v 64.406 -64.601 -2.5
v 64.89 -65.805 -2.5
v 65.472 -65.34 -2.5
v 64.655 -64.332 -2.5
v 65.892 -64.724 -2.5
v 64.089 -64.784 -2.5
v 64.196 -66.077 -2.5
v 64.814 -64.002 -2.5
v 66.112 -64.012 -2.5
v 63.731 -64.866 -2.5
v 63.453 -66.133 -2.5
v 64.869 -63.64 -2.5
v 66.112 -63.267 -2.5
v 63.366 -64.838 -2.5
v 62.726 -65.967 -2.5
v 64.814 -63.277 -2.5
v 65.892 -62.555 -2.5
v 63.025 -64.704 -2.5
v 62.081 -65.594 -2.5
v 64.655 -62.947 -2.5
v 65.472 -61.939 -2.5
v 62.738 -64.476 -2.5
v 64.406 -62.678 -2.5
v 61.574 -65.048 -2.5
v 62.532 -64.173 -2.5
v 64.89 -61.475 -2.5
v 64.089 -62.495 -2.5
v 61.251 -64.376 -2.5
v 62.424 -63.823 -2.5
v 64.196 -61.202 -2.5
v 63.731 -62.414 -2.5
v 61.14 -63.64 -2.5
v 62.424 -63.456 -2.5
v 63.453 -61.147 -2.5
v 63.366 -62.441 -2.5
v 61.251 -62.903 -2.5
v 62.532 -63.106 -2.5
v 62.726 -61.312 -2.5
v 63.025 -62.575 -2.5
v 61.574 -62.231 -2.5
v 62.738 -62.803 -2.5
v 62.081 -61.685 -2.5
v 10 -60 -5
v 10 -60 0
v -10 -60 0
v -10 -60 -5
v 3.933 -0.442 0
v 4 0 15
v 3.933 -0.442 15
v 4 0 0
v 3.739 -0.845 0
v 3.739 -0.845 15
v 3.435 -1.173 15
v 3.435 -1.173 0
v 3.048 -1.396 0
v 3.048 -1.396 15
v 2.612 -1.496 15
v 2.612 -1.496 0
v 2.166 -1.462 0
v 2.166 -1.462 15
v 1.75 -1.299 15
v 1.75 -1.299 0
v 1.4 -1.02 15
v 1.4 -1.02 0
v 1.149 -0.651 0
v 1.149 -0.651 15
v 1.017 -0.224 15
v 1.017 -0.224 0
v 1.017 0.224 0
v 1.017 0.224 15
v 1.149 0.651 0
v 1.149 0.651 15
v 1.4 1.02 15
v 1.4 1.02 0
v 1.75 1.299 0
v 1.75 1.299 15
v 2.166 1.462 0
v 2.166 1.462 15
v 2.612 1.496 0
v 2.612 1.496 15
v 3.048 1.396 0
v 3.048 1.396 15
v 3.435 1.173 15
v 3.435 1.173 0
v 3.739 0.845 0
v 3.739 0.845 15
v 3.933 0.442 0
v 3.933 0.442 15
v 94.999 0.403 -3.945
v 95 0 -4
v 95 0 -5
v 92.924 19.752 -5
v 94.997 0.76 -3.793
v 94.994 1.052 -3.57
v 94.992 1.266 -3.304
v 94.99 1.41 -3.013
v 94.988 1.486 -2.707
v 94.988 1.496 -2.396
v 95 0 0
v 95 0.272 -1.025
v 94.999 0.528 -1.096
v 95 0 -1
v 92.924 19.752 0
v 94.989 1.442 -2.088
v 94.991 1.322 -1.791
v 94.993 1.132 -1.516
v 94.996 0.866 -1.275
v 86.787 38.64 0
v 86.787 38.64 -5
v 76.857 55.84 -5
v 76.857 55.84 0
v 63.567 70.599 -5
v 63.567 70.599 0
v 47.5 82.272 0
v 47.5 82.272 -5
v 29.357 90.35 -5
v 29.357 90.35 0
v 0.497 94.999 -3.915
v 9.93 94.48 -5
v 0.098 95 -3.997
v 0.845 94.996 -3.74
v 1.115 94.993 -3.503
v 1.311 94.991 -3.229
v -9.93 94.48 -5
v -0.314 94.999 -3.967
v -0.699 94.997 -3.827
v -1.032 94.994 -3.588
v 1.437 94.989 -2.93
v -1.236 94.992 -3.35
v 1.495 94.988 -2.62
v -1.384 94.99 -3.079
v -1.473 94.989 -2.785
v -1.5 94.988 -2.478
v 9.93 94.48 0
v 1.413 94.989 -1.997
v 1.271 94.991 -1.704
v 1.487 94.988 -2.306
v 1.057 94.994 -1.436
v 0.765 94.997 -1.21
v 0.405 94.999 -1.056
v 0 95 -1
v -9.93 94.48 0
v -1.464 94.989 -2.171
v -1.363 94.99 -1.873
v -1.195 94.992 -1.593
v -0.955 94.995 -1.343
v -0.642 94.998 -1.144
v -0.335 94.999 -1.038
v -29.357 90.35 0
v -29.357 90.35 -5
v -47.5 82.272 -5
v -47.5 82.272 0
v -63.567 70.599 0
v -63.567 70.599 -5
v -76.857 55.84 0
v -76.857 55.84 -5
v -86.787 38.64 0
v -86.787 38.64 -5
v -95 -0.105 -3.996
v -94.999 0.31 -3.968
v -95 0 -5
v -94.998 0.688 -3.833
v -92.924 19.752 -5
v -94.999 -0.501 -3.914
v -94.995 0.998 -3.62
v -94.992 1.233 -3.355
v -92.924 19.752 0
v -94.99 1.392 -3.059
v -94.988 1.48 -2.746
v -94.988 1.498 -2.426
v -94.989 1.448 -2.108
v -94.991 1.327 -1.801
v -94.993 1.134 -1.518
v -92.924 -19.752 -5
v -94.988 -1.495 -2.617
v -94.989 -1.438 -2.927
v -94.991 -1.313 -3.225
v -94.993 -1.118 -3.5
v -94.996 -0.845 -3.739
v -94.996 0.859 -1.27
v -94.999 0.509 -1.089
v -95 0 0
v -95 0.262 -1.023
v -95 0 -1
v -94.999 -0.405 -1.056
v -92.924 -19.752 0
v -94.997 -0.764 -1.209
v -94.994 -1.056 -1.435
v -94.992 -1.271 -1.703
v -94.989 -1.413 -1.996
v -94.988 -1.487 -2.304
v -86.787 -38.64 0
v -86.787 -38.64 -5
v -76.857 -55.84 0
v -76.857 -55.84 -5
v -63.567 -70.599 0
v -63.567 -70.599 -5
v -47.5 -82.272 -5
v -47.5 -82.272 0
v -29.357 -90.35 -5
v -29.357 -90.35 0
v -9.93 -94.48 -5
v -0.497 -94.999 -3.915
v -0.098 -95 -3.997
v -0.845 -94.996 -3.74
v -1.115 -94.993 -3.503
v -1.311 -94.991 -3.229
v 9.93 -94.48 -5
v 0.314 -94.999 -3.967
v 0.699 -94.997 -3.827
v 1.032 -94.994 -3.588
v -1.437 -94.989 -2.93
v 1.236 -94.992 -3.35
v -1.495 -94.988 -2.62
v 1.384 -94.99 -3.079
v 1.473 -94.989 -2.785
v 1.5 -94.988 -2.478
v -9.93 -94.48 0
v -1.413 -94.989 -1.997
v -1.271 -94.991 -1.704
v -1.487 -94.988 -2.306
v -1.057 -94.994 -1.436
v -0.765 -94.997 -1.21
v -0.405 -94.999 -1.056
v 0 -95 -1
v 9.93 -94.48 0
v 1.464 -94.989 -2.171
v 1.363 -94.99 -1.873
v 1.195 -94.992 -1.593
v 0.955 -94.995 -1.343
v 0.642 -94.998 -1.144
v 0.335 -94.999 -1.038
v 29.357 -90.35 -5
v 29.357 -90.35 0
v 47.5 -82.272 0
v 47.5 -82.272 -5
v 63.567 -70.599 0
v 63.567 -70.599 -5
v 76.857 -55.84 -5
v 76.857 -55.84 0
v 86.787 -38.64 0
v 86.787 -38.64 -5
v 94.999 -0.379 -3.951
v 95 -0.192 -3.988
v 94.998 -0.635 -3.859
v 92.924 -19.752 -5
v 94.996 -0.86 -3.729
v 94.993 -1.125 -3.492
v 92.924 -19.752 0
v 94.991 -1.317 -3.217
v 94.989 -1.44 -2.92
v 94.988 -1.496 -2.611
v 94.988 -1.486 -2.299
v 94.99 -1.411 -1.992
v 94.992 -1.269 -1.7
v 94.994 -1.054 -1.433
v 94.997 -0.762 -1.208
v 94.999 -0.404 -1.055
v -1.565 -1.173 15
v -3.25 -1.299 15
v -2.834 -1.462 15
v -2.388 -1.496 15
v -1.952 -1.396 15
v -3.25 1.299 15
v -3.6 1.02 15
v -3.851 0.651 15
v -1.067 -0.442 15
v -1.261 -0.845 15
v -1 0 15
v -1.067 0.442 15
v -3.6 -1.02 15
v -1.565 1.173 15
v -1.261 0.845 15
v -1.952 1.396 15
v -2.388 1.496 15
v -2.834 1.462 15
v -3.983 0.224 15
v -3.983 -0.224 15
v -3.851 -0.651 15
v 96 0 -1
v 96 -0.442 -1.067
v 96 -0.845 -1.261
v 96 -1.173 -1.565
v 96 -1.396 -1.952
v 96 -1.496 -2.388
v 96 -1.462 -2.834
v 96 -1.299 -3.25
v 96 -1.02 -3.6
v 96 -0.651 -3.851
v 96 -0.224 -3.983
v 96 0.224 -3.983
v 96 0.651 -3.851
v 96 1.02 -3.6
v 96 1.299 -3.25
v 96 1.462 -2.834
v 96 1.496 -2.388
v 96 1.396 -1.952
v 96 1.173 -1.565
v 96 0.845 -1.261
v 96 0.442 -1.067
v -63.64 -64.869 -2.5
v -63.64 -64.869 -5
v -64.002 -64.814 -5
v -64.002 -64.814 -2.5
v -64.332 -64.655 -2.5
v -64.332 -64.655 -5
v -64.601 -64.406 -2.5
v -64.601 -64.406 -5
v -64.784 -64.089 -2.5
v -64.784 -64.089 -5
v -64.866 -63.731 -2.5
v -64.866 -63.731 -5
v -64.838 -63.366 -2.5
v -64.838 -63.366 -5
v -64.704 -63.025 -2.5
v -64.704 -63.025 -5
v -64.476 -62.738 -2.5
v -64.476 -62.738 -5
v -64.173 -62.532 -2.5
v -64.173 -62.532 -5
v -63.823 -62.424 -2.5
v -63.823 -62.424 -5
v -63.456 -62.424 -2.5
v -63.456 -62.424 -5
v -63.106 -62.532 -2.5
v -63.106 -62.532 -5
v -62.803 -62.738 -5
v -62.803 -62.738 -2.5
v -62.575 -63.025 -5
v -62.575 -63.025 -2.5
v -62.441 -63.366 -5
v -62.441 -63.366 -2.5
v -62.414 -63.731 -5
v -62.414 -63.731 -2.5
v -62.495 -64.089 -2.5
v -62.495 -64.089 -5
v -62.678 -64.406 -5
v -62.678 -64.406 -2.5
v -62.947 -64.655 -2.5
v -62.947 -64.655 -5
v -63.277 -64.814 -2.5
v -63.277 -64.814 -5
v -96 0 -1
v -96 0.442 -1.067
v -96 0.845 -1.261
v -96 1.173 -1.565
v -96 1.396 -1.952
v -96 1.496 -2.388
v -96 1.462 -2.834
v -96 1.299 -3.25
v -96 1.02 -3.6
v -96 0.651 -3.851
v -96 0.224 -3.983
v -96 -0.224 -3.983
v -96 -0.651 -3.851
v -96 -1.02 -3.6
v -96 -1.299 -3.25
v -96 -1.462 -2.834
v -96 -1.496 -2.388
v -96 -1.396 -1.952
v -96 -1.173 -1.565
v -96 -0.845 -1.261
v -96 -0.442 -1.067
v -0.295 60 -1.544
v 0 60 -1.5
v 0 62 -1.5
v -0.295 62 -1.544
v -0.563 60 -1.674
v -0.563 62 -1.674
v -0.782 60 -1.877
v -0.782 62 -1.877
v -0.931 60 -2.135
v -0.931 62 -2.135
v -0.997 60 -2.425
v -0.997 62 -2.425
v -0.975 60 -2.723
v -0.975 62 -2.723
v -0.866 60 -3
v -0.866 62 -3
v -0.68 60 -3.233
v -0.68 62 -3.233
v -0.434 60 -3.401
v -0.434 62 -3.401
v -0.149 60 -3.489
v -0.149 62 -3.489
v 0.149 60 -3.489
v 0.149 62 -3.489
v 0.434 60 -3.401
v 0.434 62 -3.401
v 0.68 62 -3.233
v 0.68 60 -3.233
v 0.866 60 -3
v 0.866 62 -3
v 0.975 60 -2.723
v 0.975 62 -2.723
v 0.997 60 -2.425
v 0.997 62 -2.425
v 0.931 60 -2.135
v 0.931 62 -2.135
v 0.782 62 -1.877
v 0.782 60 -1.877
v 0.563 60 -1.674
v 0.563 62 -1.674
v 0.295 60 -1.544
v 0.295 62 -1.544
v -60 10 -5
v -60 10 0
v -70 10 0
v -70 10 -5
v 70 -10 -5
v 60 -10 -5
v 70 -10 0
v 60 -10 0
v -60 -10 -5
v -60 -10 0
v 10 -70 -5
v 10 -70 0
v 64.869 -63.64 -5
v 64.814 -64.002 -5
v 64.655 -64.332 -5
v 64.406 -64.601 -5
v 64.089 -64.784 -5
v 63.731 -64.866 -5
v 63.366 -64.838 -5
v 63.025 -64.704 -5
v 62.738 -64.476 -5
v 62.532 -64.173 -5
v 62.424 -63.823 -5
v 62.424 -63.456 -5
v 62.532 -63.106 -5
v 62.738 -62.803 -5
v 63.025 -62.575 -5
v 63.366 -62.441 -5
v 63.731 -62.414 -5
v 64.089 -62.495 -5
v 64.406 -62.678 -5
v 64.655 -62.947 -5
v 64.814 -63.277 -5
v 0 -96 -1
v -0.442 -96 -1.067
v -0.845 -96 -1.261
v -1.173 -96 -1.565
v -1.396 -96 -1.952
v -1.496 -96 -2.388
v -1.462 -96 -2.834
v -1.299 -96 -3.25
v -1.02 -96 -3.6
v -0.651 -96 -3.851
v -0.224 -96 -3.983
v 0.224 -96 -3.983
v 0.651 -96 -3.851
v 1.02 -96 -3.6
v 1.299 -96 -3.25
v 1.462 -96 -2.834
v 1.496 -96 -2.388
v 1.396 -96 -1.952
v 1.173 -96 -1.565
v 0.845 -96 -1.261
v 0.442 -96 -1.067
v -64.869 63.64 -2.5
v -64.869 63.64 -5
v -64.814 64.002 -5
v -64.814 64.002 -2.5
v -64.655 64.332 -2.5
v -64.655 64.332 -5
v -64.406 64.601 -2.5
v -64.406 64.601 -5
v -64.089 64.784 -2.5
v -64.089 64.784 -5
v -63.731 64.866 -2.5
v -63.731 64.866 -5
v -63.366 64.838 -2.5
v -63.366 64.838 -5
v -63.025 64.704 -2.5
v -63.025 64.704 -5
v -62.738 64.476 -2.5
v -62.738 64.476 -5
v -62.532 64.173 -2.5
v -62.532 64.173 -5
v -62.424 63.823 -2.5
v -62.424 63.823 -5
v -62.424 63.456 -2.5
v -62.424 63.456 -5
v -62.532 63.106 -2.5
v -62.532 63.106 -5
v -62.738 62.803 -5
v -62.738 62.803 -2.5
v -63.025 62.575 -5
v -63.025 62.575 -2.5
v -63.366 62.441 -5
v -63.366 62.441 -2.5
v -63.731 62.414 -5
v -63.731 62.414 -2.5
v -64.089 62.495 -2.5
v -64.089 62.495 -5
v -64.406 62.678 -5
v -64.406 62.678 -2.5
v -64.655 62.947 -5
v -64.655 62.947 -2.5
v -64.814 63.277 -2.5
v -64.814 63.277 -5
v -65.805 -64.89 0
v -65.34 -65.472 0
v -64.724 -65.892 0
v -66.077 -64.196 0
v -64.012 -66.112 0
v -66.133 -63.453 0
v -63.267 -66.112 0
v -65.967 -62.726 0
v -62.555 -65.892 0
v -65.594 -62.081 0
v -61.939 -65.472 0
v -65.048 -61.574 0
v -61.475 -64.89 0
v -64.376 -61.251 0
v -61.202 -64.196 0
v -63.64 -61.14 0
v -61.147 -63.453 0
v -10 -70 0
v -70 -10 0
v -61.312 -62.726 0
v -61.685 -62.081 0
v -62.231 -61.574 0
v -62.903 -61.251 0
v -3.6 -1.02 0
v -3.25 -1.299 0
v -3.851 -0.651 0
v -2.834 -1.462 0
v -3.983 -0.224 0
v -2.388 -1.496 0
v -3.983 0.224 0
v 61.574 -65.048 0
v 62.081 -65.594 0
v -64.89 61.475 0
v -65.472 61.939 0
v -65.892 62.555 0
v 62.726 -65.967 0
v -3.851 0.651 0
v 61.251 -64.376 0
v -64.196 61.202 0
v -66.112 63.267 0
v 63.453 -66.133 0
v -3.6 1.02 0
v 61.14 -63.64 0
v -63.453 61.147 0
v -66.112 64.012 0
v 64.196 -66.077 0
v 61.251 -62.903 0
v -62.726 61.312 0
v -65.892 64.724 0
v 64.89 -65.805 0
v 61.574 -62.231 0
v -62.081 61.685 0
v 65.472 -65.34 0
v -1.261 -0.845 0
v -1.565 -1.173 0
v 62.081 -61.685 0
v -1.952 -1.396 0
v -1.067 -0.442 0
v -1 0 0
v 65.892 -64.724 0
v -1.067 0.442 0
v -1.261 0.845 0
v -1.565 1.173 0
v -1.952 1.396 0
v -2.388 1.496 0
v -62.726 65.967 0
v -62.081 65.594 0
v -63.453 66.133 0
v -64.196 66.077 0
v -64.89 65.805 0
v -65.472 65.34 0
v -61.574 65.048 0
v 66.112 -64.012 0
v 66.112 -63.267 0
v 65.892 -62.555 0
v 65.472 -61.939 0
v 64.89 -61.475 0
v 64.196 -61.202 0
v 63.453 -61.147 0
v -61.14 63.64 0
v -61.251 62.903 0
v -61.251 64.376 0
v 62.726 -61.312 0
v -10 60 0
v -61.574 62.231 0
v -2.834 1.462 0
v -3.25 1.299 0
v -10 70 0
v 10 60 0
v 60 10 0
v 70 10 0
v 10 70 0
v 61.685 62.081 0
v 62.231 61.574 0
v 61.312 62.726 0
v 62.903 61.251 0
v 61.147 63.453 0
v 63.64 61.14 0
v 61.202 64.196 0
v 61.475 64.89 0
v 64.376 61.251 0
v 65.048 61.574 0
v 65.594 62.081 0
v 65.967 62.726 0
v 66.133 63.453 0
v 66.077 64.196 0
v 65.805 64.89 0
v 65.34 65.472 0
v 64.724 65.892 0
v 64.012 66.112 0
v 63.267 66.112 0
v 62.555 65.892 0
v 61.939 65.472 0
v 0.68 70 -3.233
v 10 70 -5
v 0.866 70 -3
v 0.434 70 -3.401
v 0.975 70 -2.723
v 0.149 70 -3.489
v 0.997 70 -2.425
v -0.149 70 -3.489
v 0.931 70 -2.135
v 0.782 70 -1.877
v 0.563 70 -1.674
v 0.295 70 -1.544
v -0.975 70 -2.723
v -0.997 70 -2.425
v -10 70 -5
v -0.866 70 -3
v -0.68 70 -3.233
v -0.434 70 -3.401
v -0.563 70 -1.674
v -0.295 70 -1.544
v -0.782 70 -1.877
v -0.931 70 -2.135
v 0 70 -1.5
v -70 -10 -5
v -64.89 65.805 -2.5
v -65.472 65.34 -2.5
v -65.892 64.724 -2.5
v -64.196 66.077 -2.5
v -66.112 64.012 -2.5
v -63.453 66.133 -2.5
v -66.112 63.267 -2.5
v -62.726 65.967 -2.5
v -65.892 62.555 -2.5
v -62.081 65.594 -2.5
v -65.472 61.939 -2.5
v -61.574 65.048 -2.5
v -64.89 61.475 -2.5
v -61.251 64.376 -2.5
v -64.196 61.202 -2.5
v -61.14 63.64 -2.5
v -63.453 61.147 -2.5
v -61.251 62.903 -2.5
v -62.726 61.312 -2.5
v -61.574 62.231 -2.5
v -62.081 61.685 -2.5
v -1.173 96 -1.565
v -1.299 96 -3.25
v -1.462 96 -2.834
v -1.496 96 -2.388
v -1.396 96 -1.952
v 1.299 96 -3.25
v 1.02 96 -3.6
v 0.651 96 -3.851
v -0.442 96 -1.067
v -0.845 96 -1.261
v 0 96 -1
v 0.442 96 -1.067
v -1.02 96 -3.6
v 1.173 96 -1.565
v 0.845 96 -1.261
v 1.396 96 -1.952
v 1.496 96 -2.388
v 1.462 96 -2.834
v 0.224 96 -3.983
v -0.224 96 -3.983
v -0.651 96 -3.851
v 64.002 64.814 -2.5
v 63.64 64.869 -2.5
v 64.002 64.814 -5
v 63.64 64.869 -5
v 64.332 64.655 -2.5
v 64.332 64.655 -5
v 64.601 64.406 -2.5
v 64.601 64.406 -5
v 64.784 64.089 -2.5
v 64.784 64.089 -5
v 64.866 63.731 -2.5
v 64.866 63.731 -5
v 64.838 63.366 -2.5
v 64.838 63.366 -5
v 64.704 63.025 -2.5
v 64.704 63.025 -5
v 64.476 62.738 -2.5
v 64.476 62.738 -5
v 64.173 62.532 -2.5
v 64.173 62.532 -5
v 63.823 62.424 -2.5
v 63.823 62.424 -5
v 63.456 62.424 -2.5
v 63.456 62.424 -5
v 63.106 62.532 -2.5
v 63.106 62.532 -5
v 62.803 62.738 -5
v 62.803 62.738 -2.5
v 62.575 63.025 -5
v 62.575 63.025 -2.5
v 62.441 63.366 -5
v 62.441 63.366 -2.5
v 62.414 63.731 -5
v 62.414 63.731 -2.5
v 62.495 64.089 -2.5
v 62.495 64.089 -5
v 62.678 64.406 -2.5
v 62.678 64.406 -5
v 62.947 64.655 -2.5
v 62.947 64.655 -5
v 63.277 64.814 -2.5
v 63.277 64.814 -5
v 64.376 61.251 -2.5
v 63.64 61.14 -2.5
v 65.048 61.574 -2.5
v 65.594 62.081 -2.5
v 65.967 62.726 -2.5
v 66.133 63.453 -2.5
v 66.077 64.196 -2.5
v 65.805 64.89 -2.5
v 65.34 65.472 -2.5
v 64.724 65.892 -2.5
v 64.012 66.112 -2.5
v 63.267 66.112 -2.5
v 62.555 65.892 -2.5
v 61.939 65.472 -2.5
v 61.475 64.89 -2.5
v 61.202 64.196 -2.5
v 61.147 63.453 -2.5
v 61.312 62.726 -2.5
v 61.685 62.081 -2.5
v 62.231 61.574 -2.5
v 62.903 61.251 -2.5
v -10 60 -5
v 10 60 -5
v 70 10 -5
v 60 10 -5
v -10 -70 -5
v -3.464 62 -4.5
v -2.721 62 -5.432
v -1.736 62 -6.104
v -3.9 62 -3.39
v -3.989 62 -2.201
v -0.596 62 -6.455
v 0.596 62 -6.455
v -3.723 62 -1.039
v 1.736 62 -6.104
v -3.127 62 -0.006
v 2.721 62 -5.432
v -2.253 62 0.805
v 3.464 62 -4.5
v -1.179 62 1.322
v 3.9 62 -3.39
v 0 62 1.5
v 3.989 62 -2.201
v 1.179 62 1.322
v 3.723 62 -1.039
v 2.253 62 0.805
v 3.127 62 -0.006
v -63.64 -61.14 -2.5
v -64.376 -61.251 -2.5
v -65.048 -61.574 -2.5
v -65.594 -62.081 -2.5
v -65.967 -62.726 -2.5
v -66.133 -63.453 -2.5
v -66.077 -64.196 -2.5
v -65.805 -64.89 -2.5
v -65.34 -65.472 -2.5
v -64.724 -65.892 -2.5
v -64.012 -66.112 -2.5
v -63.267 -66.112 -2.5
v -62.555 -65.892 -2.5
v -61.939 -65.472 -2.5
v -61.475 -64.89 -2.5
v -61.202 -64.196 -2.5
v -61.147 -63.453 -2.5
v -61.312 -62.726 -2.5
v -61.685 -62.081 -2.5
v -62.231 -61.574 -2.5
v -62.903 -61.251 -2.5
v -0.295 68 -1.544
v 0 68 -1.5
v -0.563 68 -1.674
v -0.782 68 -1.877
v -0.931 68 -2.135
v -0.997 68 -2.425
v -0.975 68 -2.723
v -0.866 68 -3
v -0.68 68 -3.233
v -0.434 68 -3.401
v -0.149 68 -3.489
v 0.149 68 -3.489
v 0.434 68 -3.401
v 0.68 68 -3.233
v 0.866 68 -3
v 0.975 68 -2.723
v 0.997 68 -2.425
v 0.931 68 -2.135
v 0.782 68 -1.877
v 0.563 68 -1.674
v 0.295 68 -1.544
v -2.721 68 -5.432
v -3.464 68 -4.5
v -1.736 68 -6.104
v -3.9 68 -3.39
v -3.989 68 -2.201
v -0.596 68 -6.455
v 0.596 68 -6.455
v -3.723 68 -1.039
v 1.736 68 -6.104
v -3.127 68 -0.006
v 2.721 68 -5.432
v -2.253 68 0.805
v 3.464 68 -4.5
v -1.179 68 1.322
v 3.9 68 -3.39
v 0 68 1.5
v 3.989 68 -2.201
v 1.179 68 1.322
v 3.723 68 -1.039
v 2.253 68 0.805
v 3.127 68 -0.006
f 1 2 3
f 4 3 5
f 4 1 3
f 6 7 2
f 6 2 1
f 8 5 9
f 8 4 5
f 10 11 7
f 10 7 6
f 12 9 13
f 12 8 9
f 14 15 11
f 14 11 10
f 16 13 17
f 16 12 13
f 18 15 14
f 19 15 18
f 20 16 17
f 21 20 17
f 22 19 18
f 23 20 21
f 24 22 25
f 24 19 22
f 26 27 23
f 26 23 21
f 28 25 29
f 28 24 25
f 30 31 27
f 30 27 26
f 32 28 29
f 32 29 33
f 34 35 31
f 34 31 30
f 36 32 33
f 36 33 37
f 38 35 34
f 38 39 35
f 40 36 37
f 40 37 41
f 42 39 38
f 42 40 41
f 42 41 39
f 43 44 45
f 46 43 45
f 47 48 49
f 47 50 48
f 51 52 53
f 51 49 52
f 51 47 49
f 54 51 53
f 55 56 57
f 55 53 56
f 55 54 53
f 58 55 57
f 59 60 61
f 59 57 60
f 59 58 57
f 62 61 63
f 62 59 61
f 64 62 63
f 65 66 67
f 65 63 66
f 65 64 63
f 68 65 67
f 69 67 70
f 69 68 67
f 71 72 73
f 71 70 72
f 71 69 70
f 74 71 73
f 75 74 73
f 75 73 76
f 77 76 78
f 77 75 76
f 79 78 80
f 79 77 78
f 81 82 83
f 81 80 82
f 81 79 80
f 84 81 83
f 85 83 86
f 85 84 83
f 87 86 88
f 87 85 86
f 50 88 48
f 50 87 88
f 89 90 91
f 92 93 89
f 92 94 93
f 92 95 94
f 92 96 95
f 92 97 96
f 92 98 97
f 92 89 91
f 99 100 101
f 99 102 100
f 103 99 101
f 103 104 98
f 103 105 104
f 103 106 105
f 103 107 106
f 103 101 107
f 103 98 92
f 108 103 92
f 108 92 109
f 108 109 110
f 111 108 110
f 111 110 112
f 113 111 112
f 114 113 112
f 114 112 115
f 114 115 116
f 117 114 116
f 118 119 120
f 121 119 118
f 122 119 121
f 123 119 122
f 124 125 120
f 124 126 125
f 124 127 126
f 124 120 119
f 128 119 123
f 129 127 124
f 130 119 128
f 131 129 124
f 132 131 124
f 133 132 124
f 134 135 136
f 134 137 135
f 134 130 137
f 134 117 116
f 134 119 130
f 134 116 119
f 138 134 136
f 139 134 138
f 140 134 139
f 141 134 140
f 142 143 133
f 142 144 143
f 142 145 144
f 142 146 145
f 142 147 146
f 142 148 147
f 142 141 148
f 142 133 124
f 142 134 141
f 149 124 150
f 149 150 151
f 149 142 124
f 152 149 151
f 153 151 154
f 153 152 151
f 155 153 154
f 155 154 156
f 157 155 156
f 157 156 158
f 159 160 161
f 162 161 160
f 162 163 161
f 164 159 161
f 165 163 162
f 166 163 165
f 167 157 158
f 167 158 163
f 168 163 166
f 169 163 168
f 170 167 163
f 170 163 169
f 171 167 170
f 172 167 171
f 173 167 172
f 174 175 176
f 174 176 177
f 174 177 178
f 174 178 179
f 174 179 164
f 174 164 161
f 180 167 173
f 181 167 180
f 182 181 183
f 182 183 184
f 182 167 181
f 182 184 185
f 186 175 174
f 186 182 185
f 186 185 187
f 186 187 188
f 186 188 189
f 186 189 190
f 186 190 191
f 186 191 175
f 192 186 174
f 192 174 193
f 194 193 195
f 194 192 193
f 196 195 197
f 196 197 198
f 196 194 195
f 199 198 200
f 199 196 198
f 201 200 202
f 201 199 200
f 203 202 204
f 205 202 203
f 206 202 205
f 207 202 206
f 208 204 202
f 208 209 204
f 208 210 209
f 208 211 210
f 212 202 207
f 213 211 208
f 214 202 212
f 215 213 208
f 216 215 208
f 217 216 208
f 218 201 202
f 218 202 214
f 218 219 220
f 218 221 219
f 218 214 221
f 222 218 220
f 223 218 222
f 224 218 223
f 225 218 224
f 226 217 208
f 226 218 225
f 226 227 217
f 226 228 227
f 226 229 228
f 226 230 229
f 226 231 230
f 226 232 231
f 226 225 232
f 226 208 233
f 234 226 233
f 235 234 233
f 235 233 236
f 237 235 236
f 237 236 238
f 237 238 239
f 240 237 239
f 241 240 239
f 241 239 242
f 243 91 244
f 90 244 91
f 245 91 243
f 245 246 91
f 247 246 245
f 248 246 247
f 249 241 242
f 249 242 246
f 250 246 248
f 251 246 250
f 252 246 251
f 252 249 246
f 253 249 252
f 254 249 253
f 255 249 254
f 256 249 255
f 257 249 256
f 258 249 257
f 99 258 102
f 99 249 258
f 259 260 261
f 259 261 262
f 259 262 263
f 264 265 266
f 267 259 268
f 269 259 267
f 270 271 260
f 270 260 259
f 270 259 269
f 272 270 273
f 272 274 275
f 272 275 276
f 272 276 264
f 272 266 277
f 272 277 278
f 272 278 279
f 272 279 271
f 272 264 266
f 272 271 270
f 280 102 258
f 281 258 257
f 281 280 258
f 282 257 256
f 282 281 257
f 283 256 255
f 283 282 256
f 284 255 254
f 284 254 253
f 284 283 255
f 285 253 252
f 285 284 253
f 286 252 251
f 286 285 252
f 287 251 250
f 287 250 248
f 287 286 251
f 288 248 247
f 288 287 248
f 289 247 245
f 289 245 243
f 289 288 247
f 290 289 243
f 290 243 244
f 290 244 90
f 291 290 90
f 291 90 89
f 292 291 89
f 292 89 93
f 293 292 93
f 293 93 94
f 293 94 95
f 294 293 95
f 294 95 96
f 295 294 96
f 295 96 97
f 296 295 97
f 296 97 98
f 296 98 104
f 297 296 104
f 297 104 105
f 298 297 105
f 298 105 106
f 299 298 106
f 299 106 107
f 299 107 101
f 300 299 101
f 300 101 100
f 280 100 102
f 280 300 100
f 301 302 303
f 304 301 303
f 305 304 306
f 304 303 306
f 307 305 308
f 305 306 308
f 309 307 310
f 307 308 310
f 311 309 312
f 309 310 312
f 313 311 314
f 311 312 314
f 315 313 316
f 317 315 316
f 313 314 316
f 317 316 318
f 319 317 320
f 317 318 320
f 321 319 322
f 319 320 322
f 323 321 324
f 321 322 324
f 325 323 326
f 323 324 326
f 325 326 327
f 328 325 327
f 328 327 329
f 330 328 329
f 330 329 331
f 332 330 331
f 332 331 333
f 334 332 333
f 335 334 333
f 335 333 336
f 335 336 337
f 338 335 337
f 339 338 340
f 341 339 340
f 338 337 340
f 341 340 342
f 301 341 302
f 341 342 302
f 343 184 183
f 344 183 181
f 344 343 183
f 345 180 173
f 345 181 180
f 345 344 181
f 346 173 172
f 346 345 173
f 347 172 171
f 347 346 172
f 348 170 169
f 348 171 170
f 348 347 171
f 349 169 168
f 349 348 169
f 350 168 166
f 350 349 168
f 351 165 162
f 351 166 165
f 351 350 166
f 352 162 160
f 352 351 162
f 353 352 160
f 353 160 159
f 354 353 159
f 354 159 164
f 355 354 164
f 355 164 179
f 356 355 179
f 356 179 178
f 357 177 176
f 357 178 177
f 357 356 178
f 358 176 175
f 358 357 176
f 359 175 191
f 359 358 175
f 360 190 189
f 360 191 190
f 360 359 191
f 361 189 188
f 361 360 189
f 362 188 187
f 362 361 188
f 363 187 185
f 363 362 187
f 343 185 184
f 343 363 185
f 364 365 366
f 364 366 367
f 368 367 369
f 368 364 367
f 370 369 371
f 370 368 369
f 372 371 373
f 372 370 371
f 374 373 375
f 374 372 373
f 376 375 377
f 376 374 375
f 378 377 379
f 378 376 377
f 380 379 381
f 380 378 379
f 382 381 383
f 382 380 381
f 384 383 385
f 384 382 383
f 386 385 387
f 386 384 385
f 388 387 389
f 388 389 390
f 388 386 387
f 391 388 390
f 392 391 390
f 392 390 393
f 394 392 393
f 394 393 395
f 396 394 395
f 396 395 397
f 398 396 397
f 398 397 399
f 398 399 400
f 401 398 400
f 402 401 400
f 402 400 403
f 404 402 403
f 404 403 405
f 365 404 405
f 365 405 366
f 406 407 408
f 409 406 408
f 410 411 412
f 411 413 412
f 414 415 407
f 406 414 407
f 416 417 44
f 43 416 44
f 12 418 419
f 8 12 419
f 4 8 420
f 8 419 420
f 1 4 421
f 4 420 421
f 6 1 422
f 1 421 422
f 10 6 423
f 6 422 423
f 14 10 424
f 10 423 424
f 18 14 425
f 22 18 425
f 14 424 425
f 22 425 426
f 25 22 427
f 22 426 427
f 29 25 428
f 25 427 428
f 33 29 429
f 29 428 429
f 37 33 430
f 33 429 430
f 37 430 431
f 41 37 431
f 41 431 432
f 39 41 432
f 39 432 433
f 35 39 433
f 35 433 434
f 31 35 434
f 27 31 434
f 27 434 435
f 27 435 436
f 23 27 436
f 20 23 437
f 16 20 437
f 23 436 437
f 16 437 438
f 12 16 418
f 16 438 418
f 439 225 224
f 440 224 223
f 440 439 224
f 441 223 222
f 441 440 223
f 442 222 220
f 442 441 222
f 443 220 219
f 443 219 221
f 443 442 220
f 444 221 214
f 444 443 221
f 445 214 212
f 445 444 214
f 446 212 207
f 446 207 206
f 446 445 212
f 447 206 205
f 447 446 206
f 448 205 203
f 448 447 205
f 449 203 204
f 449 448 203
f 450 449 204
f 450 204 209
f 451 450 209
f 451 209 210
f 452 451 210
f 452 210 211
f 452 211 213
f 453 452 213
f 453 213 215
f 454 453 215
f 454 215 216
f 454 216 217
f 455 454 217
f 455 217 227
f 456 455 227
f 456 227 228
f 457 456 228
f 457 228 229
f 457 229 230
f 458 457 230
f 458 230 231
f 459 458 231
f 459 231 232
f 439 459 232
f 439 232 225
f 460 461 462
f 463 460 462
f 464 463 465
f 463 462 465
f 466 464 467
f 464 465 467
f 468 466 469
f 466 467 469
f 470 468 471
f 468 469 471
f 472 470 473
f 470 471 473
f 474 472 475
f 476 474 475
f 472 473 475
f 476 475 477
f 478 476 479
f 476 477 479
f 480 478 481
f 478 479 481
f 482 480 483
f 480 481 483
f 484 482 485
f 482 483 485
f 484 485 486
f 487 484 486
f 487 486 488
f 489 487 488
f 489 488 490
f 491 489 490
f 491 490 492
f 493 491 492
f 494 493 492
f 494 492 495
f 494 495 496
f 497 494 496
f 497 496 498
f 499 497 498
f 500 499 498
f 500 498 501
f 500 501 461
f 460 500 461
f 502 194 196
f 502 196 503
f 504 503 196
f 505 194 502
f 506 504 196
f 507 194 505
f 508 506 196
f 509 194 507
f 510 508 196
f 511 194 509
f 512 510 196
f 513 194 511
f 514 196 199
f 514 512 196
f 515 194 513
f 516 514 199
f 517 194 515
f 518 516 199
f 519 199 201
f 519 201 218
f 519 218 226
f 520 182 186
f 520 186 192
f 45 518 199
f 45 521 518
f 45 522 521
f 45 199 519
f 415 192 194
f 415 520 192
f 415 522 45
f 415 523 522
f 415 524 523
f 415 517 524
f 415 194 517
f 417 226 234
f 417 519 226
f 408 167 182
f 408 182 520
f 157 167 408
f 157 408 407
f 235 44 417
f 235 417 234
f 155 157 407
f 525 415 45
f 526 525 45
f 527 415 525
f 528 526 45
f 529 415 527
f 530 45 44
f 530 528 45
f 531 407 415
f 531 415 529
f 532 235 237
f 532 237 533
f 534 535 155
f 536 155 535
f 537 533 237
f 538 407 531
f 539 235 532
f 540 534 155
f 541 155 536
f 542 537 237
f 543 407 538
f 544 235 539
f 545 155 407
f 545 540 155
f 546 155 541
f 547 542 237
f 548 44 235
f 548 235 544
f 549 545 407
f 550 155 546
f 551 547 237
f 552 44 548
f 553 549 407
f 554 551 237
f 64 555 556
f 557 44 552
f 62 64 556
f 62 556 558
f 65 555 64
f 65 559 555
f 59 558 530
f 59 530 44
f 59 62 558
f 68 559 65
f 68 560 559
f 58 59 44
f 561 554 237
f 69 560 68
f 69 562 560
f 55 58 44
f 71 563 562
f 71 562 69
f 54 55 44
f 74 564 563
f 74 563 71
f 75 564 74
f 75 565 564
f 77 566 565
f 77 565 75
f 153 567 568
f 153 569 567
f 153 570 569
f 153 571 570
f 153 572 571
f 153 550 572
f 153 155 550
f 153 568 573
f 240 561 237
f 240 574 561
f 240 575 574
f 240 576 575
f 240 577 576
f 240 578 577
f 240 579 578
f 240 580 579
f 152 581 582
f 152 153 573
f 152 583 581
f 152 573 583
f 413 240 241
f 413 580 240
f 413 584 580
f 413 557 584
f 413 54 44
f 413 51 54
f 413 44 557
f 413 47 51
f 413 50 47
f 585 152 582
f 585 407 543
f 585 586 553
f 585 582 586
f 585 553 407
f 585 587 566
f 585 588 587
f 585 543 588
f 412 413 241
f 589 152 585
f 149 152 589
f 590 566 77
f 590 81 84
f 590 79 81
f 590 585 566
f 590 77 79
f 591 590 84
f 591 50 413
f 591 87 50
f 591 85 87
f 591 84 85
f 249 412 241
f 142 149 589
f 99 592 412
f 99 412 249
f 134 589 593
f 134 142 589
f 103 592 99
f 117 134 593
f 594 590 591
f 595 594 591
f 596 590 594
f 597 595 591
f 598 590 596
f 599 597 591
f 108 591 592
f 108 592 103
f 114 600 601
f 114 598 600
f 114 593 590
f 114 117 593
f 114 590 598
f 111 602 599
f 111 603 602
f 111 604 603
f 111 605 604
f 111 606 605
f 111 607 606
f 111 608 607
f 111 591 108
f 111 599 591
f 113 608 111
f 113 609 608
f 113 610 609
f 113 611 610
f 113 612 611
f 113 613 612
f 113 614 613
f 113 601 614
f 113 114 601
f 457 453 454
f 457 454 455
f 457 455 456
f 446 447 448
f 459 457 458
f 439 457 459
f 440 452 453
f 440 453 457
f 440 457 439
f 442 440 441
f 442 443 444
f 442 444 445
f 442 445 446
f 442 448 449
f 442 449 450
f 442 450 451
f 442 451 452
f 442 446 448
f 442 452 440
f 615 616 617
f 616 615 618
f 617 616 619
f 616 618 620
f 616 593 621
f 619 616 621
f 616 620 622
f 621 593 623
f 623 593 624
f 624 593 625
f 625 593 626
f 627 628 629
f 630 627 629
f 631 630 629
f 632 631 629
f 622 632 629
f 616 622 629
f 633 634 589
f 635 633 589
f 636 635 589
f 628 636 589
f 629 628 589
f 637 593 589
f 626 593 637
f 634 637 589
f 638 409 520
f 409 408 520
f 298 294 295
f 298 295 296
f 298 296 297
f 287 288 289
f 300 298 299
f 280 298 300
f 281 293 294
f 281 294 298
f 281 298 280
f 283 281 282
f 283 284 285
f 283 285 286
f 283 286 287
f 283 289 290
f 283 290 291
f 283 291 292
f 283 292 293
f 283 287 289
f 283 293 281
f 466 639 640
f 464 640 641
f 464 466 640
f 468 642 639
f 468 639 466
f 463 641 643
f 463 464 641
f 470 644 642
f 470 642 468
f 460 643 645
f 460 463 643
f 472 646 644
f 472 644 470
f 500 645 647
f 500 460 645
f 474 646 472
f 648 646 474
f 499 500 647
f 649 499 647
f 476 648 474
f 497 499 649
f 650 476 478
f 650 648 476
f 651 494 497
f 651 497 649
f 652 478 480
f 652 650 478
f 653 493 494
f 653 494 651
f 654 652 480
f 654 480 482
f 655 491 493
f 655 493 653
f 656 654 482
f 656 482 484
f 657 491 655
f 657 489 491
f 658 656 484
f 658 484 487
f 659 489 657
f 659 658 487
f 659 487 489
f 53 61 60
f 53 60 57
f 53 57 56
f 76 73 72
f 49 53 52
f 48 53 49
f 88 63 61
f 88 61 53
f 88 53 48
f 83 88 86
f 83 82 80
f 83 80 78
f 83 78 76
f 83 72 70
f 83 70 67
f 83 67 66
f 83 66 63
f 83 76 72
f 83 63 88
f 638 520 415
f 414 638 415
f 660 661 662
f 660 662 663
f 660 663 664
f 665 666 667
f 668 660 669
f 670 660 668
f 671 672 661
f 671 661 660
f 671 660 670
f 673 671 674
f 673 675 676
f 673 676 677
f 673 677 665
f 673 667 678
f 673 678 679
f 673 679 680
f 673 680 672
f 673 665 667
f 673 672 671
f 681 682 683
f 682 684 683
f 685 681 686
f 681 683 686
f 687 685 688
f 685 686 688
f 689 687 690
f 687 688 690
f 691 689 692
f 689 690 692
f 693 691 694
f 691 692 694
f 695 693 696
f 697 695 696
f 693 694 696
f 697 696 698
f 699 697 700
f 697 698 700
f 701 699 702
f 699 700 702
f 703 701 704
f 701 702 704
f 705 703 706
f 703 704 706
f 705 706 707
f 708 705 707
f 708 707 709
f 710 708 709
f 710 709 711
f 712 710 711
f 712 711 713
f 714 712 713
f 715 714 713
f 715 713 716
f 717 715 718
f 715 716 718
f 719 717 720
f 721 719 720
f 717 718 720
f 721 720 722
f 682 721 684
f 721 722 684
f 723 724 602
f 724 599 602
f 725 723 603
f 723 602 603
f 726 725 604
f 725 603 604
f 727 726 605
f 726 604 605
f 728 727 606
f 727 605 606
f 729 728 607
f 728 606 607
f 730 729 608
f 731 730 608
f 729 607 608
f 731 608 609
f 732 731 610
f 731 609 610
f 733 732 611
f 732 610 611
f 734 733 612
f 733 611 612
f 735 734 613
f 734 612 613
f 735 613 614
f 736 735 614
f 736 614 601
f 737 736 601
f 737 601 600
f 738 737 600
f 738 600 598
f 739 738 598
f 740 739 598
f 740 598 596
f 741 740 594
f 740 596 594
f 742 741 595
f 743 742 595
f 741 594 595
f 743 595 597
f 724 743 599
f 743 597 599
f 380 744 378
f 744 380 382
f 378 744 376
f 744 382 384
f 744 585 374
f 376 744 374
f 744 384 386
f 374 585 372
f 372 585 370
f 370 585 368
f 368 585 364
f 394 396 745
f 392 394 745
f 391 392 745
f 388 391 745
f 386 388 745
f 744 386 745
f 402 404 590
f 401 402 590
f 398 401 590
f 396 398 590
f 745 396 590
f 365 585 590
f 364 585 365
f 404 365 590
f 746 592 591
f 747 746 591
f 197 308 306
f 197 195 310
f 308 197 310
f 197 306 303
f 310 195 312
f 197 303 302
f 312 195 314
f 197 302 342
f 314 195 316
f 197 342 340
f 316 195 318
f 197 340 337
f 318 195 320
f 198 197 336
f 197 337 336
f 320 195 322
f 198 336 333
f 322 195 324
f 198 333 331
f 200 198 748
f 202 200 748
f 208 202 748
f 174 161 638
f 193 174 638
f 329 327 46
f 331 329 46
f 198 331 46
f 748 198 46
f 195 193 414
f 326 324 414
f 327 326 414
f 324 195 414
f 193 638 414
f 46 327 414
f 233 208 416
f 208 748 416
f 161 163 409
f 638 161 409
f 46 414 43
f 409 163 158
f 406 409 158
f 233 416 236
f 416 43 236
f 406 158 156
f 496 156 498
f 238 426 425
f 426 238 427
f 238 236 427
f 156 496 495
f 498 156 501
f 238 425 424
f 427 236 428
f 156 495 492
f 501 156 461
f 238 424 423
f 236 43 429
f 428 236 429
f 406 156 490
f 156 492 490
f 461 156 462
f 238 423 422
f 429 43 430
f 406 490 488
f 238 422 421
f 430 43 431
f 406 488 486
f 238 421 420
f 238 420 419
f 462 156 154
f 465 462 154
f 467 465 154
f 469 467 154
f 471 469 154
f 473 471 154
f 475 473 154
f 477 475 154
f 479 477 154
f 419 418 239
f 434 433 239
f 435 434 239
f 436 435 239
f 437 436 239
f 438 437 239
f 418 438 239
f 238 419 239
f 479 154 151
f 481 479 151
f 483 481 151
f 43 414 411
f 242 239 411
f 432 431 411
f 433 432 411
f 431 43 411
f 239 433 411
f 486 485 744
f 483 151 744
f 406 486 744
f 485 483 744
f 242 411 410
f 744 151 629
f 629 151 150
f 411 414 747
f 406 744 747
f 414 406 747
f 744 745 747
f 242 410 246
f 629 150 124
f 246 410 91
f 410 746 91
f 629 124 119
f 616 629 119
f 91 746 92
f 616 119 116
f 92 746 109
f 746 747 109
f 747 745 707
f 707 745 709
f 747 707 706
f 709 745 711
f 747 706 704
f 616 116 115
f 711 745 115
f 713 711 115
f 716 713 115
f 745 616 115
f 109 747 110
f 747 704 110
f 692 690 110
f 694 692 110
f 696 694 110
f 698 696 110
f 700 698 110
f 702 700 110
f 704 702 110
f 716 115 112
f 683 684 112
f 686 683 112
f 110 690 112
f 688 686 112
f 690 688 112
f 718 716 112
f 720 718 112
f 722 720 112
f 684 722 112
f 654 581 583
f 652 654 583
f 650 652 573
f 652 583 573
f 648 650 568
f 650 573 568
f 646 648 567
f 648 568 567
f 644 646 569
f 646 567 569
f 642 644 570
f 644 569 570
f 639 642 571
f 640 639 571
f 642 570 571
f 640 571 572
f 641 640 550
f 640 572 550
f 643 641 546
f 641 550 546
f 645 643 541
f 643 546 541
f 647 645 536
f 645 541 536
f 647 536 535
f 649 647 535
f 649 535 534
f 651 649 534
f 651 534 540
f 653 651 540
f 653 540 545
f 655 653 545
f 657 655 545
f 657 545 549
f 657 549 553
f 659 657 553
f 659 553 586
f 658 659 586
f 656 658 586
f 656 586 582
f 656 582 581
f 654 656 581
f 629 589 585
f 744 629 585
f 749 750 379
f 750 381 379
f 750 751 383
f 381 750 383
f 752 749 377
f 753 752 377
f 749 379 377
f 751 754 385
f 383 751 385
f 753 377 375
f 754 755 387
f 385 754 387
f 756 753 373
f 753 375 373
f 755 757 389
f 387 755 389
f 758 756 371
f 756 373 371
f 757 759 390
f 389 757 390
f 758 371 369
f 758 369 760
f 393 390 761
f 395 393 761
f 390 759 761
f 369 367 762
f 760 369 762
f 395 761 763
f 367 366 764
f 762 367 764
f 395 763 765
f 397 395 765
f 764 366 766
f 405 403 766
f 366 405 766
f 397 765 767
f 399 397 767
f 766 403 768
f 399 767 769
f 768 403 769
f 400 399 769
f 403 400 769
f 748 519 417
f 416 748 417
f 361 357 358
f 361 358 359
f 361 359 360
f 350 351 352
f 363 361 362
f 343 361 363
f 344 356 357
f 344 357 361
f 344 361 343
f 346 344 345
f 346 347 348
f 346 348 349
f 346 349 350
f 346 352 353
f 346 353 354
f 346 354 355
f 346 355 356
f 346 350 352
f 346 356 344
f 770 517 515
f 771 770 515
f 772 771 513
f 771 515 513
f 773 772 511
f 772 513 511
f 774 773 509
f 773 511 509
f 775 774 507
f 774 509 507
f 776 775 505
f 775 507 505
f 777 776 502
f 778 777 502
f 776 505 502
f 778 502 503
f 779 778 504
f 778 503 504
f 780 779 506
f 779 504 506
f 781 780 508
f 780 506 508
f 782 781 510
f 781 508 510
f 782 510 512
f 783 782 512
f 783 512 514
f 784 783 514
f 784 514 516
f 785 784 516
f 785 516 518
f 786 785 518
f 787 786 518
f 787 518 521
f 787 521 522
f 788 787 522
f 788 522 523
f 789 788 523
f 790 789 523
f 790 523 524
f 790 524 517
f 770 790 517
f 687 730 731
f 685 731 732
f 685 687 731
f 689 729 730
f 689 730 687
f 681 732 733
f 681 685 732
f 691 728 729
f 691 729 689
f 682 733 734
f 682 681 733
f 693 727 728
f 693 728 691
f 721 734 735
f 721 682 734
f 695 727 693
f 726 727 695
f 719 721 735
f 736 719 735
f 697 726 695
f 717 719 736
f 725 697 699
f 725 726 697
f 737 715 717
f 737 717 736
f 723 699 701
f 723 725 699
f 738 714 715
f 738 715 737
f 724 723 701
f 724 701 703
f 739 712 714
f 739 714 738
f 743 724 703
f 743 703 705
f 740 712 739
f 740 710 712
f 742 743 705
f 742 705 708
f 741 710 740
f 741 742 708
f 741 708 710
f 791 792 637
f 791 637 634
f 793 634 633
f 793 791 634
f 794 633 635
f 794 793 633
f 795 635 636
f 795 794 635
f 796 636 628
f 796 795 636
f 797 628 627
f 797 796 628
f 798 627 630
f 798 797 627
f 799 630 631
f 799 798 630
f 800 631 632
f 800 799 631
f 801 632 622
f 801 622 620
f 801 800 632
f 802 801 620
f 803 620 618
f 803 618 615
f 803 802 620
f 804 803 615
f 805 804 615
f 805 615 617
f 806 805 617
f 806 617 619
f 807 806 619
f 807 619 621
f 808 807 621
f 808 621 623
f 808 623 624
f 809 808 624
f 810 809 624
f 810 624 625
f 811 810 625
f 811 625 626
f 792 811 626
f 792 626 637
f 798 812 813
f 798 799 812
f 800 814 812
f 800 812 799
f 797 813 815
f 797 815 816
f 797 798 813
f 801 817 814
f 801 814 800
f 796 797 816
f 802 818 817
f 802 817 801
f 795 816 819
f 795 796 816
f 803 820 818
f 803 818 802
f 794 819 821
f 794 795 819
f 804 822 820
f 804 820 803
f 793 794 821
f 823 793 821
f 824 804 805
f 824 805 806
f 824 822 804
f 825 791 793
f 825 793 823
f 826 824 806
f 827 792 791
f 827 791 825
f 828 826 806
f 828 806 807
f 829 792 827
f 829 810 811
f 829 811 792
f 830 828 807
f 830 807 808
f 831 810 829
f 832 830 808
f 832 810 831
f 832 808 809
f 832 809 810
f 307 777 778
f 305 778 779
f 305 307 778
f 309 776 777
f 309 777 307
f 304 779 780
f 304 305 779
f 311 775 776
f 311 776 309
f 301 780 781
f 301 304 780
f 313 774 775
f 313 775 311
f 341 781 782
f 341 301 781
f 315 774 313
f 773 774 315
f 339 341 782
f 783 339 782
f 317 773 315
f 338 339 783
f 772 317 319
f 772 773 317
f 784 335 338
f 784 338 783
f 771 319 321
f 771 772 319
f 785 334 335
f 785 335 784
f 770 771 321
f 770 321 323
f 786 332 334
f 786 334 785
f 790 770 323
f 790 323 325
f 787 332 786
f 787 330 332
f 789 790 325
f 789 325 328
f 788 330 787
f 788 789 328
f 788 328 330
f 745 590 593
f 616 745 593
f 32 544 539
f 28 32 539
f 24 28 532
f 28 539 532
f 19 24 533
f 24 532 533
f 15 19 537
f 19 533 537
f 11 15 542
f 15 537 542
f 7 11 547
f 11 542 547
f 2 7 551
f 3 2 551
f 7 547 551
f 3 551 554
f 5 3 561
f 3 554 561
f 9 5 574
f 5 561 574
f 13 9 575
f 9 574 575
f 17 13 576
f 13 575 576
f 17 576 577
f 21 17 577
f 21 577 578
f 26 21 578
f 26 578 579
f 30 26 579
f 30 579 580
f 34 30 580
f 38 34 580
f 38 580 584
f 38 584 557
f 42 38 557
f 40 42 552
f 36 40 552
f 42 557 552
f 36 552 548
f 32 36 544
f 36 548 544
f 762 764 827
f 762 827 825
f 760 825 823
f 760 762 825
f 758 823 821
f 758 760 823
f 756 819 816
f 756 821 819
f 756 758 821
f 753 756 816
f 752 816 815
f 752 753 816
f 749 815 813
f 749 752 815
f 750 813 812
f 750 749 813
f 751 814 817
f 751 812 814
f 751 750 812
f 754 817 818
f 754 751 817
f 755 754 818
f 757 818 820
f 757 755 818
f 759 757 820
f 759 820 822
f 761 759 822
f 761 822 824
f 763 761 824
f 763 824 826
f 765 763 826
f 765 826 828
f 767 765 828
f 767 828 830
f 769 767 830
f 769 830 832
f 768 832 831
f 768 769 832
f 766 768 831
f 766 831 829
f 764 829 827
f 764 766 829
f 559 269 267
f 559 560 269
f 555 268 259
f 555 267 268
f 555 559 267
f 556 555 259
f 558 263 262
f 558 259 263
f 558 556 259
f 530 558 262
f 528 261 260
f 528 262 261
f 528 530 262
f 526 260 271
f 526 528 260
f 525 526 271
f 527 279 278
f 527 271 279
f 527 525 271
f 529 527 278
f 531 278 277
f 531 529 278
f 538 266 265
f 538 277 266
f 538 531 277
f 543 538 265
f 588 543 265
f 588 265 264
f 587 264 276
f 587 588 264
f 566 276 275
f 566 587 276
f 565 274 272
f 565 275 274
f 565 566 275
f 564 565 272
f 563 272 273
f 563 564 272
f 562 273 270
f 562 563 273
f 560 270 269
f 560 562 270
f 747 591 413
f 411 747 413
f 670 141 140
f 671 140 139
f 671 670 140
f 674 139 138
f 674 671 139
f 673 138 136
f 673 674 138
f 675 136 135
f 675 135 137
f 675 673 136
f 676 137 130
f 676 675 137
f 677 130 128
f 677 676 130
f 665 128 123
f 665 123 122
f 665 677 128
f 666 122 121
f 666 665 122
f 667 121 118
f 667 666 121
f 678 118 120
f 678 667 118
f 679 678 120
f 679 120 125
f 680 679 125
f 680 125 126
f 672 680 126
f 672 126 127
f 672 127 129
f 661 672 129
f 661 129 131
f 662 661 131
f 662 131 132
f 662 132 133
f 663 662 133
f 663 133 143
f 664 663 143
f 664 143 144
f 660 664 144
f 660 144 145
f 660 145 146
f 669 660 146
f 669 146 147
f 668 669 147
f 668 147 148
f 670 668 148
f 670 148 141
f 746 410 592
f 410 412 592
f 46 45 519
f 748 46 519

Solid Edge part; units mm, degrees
sketch "Sketch1" plane through (0, 0, 0) normal (0, 0, 1) x (1, 0, 0)
  circle A0 centre (0, 0) radius 95
extrude "Protrusion1" add sketch "Sketch1" against normal blind 5
sketch "Sketch2" plane through (0, 0, 0) normal (0, 0, 1) x (1, 0, 0)
  circle A0 centre (-2.5, 0) radius 1.5
  circle A1 centre (2.5, 0) radius 1.5
  dimension "D1" = 2.5
  dimension "D2" = 2.5
extrude "Wyciągnięcie_2" add sketch "Sketch2" along normal blind 15
sketch "Sketch3" plane through (0, 0, 0) normal (0, 0, 1) x (1, 0, 0)
  line L0 (-10, 60) -> (10, 60)
  line L1 (10, 60) -> (10, 70)
  line L2 (10, 70) -> (-10, 70)
  line L3 (-10, 70) -> (-10, 60)
extrude "Cutout1" cut sketch "Sketch3" against normal up to next
sketch "Sketch4" plane through (0, 60, -2.5) normal (0, 1, 0) x (0, 0, 1)
  circle A0 centre (0, 0) radius 1
extrude "Wyciągnięcie_4" add sketch "Sketch4" along normal blind 16
sketch "Sketch5" plane through (0, 62, -2.5) normal (0, 1, 0) x (0, 0, 1)
  circle A0 centre (0, 0) radius 4
extrude "Wyciągnięcie_5" add sketch "Sketch5" along normal blind 6
hole "Otwór_5" at (-63.6396, -63.6396, 0) direction (0, 0, -1) diameter 2.459 depth 11
sketch "Sketch6" plane through (0, 0, 0) normal (0, 0, 1) x (0, 1, 0)
  circle A0 centre (-63.6396, 63.6396) radius 2.5
  dimension "D1" = 5
extrude "Wycięcie_27" cut sketch "Sketch6" against normal blind 2.5
pattern_circular "Pattern1" count 4 over 360 about axis through (0, 0, 0) along (0, 0, -1) of "Wycięcie_27", "Otwór_5"
sketch "Sketch7" plane through (0, 95, -10) normal (0, 1, 0) x (0, 0, 1)
  circle A0 centre (7.5, 0) radius 1.5
extrude "Wyciągnięcie_19" add sketch "Sketch7" against normal blind 1.2757 and the other way blind 1
pattern_circular "Pattern3" count 4 over 360 about axis through (0, 0, 0) along (0, 0, 1) of "Wyciągnięcie_19"
pattern_circular "Pattern5" count 4 over 360 about axis through (0, 0, 0) along (0, 0, -1) of "Cutout1"
